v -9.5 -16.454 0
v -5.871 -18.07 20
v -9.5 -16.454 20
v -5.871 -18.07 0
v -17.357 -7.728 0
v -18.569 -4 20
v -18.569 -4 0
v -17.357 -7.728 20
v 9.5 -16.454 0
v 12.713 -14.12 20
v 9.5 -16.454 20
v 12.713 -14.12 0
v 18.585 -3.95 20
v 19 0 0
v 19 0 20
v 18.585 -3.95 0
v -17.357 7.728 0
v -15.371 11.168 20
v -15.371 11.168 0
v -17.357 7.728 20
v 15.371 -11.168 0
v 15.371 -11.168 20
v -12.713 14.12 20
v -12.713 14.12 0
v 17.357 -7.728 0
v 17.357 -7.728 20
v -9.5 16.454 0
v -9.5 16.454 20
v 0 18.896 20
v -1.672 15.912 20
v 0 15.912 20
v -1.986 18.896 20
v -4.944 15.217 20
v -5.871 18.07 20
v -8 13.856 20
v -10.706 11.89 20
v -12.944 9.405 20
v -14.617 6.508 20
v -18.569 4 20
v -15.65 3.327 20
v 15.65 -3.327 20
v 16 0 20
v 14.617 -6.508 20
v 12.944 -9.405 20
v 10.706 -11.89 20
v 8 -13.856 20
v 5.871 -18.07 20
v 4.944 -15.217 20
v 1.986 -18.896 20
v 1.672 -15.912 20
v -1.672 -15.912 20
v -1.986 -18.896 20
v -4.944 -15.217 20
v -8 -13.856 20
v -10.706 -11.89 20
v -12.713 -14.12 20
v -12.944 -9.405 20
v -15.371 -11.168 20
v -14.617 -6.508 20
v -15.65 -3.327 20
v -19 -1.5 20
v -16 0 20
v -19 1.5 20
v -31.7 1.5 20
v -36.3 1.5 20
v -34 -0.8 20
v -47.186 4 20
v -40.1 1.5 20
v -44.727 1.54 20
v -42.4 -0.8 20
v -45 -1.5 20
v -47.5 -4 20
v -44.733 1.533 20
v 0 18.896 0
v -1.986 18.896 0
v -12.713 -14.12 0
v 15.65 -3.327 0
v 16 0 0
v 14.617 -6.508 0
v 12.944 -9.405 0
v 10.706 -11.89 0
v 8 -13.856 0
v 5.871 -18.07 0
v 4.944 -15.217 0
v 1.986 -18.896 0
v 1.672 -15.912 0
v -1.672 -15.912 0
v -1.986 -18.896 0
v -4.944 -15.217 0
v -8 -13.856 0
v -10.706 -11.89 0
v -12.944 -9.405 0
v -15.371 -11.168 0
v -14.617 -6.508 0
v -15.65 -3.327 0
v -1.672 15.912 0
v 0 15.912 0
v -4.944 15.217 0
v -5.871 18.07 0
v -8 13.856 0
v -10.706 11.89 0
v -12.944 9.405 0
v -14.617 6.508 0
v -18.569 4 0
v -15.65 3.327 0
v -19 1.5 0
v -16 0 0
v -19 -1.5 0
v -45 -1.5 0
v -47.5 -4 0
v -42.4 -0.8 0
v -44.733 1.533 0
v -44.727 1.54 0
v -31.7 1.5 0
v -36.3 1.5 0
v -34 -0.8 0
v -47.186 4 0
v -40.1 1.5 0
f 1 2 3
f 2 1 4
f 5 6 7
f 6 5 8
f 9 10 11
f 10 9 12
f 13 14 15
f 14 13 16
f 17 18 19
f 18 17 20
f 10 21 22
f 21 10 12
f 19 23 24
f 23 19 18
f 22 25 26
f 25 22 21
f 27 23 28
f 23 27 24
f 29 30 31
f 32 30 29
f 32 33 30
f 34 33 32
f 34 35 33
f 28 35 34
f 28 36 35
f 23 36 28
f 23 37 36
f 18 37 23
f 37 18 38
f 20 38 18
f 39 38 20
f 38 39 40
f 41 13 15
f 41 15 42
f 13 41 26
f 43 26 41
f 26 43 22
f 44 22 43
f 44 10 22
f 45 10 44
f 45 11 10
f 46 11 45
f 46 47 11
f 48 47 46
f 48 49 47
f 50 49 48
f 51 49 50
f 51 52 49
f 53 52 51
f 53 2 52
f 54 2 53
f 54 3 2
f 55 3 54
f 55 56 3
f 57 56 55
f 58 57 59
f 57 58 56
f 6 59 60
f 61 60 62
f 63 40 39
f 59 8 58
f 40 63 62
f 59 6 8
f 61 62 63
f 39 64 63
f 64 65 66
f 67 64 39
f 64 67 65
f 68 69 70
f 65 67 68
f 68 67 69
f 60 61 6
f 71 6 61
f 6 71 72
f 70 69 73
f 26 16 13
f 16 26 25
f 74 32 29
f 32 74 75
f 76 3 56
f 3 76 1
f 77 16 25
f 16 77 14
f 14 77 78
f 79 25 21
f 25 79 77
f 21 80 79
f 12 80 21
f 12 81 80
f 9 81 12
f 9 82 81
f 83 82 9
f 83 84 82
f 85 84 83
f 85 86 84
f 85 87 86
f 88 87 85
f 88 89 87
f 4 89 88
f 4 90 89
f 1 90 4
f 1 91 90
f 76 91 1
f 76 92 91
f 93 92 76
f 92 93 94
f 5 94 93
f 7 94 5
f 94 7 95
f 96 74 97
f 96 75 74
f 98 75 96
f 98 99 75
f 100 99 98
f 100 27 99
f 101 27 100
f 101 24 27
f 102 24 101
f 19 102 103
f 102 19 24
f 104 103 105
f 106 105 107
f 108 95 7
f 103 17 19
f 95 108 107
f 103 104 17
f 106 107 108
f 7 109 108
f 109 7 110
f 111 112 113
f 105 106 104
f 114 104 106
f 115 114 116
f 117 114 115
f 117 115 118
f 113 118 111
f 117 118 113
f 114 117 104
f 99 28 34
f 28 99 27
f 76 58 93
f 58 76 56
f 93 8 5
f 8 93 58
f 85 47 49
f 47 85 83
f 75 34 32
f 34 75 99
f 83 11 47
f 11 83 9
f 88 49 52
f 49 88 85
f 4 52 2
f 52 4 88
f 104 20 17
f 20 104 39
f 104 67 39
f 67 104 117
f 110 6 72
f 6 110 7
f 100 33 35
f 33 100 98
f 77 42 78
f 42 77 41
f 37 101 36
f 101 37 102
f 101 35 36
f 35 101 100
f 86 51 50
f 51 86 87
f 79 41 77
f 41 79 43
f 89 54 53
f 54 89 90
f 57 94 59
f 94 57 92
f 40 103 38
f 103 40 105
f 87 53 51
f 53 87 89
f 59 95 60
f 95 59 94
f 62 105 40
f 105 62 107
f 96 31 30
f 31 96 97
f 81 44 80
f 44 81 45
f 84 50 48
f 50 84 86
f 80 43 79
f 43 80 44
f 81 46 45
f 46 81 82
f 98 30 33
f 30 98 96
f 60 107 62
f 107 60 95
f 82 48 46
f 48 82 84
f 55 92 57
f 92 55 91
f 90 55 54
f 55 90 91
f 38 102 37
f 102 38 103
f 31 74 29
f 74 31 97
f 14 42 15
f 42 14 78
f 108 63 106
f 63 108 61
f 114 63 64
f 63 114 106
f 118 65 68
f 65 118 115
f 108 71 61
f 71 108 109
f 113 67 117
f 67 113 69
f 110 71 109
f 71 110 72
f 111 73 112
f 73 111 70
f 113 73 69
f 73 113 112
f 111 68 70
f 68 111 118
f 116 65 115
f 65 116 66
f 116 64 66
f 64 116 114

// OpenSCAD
//Created by Bryan Jackson
//Edit radius to match handle bars and seat. 
//Print two for handle bars, one for seat. 

radius = 16;
difference(){
    union(){
        cylinder(r=radius+3, h=20);
        translate([-40-radius/2,-4,0])
        cube([40,8,20]);
    }
        cylinder(r=radius, h=20);
        cube([radius+3,radius+3,20]);
        translate([-41-radius,-1.5,0])
        cube([38,3,20]);
    
        translate([-33-radius,-5.5,0])
        rotate([0,0,45])
            cube([8,8,20]);
}
translate([-26.4-radius,-.8,0])
rotate([0,0,45])
cube([3.3,3.3,20]);

translate([-18-radius,-.8,0])
rotate([0,0,45])
cube([3.3,3.3,20]);
